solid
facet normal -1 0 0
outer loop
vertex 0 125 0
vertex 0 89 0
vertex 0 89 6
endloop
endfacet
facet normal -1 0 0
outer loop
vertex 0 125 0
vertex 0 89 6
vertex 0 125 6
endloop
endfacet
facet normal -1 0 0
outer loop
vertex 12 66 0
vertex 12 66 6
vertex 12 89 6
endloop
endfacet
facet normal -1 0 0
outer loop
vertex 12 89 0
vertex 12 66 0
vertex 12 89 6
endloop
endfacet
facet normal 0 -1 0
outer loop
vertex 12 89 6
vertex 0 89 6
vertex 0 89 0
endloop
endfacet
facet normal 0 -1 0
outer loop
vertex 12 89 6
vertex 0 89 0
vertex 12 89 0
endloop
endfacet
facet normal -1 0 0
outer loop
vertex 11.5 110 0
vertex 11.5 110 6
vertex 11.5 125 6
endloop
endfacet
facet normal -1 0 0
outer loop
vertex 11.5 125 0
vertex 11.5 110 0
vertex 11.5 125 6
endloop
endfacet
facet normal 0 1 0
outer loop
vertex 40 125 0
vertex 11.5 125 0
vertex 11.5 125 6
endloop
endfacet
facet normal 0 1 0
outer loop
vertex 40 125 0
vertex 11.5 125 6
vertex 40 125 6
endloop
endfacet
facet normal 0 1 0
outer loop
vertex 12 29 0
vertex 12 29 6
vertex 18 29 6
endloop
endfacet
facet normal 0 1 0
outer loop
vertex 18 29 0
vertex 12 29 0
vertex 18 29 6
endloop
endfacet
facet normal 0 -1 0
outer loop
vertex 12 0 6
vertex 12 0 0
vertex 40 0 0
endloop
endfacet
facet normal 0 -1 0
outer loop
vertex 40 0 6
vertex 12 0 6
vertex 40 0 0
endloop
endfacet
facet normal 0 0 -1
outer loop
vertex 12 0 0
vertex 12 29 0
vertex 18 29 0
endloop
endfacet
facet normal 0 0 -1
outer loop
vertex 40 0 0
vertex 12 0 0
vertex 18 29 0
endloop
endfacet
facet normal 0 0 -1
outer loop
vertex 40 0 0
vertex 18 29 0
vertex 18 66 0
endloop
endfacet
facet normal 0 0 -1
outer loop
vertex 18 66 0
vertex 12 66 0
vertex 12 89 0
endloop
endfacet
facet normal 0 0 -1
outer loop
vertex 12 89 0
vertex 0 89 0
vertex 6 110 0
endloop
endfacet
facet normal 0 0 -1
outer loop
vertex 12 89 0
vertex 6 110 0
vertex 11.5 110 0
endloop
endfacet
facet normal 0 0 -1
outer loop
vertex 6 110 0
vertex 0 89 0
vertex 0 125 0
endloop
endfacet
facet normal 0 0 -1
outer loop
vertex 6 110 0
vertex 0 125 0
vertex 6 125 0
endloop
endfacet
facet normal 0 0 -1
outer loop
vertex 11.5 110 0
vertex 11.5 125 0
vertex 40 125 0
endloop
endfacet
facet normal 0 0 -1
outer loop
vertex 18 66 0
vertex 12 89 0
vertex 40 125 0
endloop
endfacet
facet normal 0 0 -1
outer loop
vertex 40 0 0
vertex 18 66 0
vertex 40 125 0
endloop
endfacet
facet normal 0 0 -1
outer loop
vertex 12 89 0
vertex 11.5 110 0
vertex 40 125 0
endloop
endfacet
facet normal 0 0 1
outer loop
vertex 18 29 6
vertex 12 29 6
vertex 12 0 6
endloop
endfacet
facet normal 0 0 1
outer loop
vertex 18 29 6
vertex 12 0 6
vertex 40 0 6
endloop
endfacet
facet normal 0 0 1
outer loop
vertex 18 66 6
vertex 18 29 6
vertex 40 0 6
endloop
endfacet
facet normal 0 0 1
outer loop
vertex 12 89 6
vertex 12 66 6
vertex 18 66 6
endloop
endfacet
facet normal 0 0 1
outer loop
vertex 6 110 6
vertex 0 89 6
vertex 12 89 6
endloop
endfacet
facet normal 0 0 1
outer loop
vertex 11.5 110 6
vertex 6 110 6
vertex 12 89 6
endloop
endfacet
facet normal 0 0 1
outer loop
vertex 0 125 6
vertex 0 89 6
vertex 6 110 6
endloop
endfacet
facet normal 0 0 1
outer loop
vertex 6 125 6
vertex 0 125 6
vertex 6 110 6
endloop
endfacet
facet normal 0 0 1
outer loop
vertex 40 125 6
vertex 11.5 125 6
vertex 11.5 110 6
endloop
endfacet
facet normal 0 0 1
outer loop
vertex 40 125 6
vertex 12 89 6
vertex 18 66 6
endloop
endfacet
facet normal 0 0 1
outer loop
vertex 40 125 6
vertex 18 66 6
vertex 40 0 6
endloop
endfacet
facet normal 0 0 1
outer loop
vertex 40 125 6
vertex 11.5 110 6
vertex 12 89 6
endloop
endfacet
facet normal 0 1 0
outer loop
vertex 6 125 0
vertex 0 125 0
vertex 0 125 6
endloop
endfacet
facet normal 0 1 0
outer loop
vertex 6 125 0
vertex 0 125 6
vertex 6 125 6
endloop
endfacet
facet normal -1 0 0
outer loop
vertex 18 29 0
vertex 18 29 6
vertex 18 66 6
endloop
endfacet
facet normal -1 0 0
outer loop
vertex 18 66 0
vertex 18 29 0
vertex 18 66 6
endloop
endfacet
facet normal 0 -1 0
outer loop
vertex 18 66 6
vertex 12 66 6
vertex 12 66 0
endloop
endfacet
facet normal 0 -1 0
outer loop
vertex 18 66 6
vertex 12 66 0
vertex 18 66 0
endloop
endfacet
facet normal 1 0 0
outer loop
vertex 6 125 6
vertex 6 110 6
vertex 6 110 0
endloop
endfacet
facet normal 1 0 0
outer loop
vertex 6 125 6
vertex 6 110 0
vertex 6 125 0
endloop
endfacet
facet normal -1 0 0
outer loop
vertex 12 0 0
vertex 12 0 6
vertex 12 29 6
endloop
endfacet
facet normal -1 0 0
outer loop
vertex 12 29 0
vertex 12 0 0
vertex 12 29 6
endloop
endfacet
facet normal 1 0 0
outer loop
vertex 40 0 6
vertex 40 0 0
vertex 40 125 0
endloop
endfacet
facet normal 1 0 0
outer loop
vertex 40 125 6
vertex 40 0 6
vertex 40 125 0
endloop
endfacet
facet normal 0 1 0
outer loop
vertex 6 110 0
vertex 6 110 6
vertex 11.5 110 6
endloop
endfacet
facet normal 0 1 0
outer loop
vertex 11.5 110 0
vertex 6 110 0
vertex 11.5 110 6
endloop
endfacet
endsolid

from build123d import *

# Parameters (mm, degrees)
SKETCH1_W           = 40
SKETCH1_H           = 125
BOSS_EXTRUDE1_DEPTH = 6
SKETCH2_W           = 5.5
SKETCH2_H           = 15
SKETCH2_W_2         = 12
SKETCH2_H_2         = 89
CUT_EXTRUDE1_DEPTH  = 132.381124976
SKETCH3_W           = 6
SKETCH3_H           = 37
CUT_EXTRUDE2_DEPTH  = 132.381124976


with BuildPart() as part:
    # Sketch1 → Boss-Extrude1 (new body)
    with BuildSketch(Plane.XY):
        with Locations((20, 62.5)):
            Rectangle(SKETCH1_W, SKETCH1_H)
    extrude(amount=BOSS_EXTRUDE1_DEPTH)

    # Sketch2 → Cut-Extrude1 (cut, through all)
    with BuildSketch(Plane.XY.offset(6)):
        with Locations((8.75, 117.5)):
            Rectangle(SKETCH2_W, SKETCH2_H)
        with Locations((6, 44.5)):
            Rectangle(SKETCH2_W_2, SKETCH2_H_2)
    extrude(amount=-CUT_EXTRUDE1_DEPTH, mode=Mode.SUBTRACT)

    # Sketch3 → Cut-Extrude2 (cut, through all)
    with BuildSketch(Plane.XY.offset(6)):
        with Locations((15, 47.5)):
            Rectangle(SKETCH3_W, SKETCH3_H)
    extrude(amount=-CUT_EXTRUDE2_DEPTH, mode=Mode.SUBTRACT)


solid = part.part
